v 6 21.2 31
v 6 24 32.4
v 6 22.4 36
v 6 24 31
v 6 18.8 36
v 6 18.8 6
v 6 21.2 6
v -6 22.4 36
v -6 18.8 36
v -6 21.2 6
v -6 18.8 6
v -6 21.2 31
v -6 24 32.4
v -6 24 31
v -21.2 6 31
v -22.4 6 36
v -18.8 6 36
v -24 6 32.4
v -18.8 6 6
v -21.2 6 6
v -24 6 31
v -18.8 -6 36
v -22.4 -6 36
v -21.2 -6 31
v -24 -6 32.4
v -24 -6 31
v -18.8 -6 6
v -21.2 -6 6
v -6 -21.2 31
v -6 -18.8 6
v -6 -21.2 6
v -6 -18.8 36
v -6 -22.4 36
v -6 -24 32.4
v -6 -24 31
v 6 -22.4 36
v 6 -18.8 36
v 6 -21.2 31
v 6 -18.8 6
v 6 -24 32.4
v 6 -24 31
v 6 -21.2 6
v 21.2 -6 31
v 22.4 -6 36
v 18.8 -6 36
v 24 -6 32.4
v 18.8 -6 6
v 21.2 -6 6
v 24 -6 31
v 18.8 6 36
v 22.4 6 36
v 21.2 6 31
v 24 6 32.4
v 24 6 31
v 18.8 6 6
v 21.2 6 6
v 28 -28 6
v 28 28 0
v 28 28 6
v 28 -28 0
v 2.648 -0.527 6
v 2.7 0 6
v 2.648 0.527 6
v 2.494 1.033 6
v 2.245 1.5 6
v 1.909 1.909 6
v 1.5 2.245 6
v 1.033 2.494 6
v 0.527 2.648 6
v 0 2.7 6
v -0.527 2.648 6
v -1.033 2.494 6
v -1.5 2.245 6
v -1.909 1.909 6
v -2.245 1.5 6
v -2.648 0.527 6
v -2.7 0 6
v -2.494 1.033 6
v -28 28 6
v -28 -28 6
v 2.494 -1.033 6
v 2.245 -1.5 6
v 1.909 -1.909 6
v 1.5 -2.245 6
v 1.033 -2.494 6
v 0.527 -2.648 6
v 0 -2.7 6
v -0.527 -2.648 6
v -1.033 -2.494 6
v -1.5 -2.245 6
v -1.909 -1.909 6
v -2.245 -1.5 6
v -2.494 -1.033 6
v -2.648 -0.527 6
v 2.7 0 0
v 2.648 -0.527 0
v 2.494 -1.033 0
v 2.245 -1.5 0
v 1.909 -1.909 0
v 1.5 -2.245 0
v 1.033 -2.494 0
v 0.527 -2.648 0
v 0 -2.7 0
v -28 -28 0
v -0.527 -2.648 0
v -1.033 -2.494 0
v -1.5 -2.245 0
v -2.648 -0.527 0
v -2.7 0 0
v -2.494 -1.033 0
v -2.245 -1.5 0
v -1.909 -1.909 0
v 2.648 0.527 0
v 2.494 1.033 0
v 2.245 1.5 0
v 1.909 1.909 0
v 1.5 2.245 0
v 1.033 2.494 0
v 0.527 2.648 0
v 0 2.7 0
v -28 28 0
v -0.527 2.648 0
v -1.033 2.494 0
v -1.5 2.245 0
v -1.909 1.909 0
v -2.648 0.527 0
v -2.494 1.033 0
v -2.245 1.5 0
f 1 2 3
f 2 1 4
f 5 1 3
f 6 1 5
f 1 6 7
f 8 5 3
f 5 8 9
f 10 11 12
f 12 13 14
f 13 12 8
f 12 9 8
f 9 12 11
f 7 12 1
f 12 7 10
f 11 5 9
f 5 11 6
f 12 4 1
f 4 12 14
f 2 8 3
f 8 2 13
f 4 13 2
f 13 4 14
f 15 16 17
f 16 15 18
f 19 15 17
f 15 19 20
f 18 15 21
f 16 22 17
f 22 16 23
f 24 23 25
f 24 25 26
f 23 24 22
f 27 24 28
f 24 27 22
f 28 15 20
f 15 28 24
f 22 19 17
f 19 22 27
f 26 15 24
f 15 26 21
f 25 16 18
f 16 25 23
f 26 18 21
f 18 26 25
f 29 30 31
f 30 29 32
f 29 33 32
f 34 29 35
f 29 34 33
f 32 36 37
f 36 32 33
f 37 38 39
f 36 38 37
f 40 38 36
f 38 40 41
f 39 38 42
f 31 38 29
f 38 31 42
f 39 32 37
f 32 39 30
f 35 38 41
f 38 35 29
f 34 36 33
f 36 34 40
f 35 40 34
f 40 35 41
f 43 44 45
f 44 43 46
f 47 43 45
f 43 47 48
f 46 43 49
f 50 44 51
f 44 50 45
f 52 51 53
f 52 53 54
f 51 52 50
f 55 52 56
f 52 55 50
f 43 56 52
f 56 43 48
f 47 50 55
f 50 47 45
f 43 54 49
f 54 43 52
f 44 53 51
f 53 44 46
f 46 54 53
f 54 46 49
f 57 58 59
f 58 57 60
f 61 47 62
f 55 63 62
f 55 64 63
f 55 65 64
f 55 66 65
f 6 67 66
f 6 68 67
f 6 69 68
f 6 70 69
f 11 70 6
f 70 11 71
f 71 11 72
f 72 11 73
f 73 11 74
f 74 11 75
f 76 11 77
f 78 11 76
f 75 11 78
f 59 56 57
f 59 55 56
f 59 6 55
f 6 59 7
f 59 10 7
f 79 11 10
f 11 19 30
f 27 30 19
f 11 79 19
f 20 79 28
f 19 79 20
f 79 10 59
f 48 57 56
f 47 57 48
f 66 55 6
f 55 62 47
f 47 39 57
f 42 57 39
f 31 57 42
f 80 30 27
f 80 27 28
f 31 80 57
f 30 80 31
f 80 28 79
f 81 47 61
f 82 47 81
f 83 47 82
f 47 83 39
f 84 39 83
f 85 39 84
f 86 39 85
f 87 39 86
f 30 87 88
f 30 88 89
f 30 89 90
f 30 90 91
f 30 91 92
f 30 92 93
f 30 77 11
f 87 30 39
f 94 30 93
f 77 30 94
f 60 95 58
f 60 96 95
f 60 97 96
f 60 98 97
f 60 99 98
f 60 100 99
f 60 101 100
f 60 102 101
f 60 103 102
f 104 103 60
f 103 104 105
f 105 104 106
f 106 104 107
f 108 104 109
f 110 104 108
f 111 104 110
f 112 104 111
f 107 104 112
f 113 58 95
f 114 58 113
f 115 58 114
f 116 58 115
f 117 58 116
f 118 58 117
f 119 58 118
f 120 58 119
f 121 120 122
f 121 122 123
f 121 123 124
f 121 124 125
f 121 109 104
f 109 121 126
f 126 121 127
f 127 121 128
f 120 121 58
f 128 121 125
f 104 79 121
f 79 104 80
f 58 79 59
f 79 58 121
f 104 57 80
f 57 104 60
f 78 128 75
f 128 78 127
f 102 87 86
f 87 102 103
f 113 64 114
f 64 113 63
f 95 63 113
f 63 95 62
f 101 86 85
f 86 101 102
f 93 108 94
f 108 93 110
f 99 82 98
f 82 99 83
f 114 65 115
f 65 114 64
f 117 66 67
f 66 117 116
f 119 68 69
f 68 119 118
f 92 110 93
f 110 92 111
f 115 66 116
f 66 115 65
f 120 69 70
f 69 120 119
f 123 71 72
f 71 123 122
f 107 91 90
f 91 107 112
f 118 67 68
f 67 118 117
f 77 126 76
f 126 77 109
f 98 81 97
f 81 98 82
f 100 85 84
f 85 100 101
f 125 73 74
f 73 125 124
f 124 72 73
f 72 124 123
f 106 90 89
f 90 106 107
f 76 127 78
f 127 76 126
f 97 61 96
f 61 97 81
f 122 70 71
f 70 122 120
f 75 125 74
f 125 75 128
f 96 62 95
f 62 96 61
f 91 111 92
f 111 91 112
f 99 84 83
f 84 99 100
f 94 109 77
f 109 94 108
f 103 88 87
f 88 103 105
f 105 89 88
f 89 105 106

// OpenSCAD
$fn = 32;

// ----------------------------------------------------------------------
// Snap-fit latch: 4 arms, 30 mm tall, 3 mm undercut hooks
// ----------------------------------------------------------------------

// --- parameters (mm) ---
base_d = 56;              // base plate depth
base_h = 6;               // base plate thickness
span = 40;                // distance between opposite arms
arm_t = 2.4;              // arm thickness
arm_d = 12;               // arm width
height = 30;              // free arm length
head_len = 3;             // hook reach
head_h = 5;               // hook height
lead = 1.4;               // lead-in ramp thickness
bore_d = 5.4;             // base fixing bore
top_z = 36;               // height of the arm tips above the base

arms = 4;

difference() {
  union() {
    /* base plate, centred on the arm ring */
    translate([-28, -28, 0]) cube([base_d, base_d, base_h]);
    for (a = [0 : 360 / arms : 359]) rotate([0, 0, a]) {
    /* arm, sunk 0.5 mm into the base */
    translate([-arm_d / 2, span / 2 - arm_t / 2, base_h - 0.5]) cube([arm_d, arm_t, height + 0.5]);
    /* hook: a convex hull of a tall inner block and a thin outer lip
       gives a flat undercut below and a lead-in ramp on top */
    hull() {
      translate([-arm_d / 2, span / 2 + arm_t / 2 - 0.6, top_z - head_h]) cube([arm_d, lead + 0.4, head_h]);
      translate([-arm_d / 2, span / 2 + arm_t / 2 - 0.2, top_z - head_h]) cube([arm_d, head_len, lead]);
    }
    }
  }
  translate([0, 0, -2.5]) cylinder(h = base_h + 5, d = bore_d);
}
